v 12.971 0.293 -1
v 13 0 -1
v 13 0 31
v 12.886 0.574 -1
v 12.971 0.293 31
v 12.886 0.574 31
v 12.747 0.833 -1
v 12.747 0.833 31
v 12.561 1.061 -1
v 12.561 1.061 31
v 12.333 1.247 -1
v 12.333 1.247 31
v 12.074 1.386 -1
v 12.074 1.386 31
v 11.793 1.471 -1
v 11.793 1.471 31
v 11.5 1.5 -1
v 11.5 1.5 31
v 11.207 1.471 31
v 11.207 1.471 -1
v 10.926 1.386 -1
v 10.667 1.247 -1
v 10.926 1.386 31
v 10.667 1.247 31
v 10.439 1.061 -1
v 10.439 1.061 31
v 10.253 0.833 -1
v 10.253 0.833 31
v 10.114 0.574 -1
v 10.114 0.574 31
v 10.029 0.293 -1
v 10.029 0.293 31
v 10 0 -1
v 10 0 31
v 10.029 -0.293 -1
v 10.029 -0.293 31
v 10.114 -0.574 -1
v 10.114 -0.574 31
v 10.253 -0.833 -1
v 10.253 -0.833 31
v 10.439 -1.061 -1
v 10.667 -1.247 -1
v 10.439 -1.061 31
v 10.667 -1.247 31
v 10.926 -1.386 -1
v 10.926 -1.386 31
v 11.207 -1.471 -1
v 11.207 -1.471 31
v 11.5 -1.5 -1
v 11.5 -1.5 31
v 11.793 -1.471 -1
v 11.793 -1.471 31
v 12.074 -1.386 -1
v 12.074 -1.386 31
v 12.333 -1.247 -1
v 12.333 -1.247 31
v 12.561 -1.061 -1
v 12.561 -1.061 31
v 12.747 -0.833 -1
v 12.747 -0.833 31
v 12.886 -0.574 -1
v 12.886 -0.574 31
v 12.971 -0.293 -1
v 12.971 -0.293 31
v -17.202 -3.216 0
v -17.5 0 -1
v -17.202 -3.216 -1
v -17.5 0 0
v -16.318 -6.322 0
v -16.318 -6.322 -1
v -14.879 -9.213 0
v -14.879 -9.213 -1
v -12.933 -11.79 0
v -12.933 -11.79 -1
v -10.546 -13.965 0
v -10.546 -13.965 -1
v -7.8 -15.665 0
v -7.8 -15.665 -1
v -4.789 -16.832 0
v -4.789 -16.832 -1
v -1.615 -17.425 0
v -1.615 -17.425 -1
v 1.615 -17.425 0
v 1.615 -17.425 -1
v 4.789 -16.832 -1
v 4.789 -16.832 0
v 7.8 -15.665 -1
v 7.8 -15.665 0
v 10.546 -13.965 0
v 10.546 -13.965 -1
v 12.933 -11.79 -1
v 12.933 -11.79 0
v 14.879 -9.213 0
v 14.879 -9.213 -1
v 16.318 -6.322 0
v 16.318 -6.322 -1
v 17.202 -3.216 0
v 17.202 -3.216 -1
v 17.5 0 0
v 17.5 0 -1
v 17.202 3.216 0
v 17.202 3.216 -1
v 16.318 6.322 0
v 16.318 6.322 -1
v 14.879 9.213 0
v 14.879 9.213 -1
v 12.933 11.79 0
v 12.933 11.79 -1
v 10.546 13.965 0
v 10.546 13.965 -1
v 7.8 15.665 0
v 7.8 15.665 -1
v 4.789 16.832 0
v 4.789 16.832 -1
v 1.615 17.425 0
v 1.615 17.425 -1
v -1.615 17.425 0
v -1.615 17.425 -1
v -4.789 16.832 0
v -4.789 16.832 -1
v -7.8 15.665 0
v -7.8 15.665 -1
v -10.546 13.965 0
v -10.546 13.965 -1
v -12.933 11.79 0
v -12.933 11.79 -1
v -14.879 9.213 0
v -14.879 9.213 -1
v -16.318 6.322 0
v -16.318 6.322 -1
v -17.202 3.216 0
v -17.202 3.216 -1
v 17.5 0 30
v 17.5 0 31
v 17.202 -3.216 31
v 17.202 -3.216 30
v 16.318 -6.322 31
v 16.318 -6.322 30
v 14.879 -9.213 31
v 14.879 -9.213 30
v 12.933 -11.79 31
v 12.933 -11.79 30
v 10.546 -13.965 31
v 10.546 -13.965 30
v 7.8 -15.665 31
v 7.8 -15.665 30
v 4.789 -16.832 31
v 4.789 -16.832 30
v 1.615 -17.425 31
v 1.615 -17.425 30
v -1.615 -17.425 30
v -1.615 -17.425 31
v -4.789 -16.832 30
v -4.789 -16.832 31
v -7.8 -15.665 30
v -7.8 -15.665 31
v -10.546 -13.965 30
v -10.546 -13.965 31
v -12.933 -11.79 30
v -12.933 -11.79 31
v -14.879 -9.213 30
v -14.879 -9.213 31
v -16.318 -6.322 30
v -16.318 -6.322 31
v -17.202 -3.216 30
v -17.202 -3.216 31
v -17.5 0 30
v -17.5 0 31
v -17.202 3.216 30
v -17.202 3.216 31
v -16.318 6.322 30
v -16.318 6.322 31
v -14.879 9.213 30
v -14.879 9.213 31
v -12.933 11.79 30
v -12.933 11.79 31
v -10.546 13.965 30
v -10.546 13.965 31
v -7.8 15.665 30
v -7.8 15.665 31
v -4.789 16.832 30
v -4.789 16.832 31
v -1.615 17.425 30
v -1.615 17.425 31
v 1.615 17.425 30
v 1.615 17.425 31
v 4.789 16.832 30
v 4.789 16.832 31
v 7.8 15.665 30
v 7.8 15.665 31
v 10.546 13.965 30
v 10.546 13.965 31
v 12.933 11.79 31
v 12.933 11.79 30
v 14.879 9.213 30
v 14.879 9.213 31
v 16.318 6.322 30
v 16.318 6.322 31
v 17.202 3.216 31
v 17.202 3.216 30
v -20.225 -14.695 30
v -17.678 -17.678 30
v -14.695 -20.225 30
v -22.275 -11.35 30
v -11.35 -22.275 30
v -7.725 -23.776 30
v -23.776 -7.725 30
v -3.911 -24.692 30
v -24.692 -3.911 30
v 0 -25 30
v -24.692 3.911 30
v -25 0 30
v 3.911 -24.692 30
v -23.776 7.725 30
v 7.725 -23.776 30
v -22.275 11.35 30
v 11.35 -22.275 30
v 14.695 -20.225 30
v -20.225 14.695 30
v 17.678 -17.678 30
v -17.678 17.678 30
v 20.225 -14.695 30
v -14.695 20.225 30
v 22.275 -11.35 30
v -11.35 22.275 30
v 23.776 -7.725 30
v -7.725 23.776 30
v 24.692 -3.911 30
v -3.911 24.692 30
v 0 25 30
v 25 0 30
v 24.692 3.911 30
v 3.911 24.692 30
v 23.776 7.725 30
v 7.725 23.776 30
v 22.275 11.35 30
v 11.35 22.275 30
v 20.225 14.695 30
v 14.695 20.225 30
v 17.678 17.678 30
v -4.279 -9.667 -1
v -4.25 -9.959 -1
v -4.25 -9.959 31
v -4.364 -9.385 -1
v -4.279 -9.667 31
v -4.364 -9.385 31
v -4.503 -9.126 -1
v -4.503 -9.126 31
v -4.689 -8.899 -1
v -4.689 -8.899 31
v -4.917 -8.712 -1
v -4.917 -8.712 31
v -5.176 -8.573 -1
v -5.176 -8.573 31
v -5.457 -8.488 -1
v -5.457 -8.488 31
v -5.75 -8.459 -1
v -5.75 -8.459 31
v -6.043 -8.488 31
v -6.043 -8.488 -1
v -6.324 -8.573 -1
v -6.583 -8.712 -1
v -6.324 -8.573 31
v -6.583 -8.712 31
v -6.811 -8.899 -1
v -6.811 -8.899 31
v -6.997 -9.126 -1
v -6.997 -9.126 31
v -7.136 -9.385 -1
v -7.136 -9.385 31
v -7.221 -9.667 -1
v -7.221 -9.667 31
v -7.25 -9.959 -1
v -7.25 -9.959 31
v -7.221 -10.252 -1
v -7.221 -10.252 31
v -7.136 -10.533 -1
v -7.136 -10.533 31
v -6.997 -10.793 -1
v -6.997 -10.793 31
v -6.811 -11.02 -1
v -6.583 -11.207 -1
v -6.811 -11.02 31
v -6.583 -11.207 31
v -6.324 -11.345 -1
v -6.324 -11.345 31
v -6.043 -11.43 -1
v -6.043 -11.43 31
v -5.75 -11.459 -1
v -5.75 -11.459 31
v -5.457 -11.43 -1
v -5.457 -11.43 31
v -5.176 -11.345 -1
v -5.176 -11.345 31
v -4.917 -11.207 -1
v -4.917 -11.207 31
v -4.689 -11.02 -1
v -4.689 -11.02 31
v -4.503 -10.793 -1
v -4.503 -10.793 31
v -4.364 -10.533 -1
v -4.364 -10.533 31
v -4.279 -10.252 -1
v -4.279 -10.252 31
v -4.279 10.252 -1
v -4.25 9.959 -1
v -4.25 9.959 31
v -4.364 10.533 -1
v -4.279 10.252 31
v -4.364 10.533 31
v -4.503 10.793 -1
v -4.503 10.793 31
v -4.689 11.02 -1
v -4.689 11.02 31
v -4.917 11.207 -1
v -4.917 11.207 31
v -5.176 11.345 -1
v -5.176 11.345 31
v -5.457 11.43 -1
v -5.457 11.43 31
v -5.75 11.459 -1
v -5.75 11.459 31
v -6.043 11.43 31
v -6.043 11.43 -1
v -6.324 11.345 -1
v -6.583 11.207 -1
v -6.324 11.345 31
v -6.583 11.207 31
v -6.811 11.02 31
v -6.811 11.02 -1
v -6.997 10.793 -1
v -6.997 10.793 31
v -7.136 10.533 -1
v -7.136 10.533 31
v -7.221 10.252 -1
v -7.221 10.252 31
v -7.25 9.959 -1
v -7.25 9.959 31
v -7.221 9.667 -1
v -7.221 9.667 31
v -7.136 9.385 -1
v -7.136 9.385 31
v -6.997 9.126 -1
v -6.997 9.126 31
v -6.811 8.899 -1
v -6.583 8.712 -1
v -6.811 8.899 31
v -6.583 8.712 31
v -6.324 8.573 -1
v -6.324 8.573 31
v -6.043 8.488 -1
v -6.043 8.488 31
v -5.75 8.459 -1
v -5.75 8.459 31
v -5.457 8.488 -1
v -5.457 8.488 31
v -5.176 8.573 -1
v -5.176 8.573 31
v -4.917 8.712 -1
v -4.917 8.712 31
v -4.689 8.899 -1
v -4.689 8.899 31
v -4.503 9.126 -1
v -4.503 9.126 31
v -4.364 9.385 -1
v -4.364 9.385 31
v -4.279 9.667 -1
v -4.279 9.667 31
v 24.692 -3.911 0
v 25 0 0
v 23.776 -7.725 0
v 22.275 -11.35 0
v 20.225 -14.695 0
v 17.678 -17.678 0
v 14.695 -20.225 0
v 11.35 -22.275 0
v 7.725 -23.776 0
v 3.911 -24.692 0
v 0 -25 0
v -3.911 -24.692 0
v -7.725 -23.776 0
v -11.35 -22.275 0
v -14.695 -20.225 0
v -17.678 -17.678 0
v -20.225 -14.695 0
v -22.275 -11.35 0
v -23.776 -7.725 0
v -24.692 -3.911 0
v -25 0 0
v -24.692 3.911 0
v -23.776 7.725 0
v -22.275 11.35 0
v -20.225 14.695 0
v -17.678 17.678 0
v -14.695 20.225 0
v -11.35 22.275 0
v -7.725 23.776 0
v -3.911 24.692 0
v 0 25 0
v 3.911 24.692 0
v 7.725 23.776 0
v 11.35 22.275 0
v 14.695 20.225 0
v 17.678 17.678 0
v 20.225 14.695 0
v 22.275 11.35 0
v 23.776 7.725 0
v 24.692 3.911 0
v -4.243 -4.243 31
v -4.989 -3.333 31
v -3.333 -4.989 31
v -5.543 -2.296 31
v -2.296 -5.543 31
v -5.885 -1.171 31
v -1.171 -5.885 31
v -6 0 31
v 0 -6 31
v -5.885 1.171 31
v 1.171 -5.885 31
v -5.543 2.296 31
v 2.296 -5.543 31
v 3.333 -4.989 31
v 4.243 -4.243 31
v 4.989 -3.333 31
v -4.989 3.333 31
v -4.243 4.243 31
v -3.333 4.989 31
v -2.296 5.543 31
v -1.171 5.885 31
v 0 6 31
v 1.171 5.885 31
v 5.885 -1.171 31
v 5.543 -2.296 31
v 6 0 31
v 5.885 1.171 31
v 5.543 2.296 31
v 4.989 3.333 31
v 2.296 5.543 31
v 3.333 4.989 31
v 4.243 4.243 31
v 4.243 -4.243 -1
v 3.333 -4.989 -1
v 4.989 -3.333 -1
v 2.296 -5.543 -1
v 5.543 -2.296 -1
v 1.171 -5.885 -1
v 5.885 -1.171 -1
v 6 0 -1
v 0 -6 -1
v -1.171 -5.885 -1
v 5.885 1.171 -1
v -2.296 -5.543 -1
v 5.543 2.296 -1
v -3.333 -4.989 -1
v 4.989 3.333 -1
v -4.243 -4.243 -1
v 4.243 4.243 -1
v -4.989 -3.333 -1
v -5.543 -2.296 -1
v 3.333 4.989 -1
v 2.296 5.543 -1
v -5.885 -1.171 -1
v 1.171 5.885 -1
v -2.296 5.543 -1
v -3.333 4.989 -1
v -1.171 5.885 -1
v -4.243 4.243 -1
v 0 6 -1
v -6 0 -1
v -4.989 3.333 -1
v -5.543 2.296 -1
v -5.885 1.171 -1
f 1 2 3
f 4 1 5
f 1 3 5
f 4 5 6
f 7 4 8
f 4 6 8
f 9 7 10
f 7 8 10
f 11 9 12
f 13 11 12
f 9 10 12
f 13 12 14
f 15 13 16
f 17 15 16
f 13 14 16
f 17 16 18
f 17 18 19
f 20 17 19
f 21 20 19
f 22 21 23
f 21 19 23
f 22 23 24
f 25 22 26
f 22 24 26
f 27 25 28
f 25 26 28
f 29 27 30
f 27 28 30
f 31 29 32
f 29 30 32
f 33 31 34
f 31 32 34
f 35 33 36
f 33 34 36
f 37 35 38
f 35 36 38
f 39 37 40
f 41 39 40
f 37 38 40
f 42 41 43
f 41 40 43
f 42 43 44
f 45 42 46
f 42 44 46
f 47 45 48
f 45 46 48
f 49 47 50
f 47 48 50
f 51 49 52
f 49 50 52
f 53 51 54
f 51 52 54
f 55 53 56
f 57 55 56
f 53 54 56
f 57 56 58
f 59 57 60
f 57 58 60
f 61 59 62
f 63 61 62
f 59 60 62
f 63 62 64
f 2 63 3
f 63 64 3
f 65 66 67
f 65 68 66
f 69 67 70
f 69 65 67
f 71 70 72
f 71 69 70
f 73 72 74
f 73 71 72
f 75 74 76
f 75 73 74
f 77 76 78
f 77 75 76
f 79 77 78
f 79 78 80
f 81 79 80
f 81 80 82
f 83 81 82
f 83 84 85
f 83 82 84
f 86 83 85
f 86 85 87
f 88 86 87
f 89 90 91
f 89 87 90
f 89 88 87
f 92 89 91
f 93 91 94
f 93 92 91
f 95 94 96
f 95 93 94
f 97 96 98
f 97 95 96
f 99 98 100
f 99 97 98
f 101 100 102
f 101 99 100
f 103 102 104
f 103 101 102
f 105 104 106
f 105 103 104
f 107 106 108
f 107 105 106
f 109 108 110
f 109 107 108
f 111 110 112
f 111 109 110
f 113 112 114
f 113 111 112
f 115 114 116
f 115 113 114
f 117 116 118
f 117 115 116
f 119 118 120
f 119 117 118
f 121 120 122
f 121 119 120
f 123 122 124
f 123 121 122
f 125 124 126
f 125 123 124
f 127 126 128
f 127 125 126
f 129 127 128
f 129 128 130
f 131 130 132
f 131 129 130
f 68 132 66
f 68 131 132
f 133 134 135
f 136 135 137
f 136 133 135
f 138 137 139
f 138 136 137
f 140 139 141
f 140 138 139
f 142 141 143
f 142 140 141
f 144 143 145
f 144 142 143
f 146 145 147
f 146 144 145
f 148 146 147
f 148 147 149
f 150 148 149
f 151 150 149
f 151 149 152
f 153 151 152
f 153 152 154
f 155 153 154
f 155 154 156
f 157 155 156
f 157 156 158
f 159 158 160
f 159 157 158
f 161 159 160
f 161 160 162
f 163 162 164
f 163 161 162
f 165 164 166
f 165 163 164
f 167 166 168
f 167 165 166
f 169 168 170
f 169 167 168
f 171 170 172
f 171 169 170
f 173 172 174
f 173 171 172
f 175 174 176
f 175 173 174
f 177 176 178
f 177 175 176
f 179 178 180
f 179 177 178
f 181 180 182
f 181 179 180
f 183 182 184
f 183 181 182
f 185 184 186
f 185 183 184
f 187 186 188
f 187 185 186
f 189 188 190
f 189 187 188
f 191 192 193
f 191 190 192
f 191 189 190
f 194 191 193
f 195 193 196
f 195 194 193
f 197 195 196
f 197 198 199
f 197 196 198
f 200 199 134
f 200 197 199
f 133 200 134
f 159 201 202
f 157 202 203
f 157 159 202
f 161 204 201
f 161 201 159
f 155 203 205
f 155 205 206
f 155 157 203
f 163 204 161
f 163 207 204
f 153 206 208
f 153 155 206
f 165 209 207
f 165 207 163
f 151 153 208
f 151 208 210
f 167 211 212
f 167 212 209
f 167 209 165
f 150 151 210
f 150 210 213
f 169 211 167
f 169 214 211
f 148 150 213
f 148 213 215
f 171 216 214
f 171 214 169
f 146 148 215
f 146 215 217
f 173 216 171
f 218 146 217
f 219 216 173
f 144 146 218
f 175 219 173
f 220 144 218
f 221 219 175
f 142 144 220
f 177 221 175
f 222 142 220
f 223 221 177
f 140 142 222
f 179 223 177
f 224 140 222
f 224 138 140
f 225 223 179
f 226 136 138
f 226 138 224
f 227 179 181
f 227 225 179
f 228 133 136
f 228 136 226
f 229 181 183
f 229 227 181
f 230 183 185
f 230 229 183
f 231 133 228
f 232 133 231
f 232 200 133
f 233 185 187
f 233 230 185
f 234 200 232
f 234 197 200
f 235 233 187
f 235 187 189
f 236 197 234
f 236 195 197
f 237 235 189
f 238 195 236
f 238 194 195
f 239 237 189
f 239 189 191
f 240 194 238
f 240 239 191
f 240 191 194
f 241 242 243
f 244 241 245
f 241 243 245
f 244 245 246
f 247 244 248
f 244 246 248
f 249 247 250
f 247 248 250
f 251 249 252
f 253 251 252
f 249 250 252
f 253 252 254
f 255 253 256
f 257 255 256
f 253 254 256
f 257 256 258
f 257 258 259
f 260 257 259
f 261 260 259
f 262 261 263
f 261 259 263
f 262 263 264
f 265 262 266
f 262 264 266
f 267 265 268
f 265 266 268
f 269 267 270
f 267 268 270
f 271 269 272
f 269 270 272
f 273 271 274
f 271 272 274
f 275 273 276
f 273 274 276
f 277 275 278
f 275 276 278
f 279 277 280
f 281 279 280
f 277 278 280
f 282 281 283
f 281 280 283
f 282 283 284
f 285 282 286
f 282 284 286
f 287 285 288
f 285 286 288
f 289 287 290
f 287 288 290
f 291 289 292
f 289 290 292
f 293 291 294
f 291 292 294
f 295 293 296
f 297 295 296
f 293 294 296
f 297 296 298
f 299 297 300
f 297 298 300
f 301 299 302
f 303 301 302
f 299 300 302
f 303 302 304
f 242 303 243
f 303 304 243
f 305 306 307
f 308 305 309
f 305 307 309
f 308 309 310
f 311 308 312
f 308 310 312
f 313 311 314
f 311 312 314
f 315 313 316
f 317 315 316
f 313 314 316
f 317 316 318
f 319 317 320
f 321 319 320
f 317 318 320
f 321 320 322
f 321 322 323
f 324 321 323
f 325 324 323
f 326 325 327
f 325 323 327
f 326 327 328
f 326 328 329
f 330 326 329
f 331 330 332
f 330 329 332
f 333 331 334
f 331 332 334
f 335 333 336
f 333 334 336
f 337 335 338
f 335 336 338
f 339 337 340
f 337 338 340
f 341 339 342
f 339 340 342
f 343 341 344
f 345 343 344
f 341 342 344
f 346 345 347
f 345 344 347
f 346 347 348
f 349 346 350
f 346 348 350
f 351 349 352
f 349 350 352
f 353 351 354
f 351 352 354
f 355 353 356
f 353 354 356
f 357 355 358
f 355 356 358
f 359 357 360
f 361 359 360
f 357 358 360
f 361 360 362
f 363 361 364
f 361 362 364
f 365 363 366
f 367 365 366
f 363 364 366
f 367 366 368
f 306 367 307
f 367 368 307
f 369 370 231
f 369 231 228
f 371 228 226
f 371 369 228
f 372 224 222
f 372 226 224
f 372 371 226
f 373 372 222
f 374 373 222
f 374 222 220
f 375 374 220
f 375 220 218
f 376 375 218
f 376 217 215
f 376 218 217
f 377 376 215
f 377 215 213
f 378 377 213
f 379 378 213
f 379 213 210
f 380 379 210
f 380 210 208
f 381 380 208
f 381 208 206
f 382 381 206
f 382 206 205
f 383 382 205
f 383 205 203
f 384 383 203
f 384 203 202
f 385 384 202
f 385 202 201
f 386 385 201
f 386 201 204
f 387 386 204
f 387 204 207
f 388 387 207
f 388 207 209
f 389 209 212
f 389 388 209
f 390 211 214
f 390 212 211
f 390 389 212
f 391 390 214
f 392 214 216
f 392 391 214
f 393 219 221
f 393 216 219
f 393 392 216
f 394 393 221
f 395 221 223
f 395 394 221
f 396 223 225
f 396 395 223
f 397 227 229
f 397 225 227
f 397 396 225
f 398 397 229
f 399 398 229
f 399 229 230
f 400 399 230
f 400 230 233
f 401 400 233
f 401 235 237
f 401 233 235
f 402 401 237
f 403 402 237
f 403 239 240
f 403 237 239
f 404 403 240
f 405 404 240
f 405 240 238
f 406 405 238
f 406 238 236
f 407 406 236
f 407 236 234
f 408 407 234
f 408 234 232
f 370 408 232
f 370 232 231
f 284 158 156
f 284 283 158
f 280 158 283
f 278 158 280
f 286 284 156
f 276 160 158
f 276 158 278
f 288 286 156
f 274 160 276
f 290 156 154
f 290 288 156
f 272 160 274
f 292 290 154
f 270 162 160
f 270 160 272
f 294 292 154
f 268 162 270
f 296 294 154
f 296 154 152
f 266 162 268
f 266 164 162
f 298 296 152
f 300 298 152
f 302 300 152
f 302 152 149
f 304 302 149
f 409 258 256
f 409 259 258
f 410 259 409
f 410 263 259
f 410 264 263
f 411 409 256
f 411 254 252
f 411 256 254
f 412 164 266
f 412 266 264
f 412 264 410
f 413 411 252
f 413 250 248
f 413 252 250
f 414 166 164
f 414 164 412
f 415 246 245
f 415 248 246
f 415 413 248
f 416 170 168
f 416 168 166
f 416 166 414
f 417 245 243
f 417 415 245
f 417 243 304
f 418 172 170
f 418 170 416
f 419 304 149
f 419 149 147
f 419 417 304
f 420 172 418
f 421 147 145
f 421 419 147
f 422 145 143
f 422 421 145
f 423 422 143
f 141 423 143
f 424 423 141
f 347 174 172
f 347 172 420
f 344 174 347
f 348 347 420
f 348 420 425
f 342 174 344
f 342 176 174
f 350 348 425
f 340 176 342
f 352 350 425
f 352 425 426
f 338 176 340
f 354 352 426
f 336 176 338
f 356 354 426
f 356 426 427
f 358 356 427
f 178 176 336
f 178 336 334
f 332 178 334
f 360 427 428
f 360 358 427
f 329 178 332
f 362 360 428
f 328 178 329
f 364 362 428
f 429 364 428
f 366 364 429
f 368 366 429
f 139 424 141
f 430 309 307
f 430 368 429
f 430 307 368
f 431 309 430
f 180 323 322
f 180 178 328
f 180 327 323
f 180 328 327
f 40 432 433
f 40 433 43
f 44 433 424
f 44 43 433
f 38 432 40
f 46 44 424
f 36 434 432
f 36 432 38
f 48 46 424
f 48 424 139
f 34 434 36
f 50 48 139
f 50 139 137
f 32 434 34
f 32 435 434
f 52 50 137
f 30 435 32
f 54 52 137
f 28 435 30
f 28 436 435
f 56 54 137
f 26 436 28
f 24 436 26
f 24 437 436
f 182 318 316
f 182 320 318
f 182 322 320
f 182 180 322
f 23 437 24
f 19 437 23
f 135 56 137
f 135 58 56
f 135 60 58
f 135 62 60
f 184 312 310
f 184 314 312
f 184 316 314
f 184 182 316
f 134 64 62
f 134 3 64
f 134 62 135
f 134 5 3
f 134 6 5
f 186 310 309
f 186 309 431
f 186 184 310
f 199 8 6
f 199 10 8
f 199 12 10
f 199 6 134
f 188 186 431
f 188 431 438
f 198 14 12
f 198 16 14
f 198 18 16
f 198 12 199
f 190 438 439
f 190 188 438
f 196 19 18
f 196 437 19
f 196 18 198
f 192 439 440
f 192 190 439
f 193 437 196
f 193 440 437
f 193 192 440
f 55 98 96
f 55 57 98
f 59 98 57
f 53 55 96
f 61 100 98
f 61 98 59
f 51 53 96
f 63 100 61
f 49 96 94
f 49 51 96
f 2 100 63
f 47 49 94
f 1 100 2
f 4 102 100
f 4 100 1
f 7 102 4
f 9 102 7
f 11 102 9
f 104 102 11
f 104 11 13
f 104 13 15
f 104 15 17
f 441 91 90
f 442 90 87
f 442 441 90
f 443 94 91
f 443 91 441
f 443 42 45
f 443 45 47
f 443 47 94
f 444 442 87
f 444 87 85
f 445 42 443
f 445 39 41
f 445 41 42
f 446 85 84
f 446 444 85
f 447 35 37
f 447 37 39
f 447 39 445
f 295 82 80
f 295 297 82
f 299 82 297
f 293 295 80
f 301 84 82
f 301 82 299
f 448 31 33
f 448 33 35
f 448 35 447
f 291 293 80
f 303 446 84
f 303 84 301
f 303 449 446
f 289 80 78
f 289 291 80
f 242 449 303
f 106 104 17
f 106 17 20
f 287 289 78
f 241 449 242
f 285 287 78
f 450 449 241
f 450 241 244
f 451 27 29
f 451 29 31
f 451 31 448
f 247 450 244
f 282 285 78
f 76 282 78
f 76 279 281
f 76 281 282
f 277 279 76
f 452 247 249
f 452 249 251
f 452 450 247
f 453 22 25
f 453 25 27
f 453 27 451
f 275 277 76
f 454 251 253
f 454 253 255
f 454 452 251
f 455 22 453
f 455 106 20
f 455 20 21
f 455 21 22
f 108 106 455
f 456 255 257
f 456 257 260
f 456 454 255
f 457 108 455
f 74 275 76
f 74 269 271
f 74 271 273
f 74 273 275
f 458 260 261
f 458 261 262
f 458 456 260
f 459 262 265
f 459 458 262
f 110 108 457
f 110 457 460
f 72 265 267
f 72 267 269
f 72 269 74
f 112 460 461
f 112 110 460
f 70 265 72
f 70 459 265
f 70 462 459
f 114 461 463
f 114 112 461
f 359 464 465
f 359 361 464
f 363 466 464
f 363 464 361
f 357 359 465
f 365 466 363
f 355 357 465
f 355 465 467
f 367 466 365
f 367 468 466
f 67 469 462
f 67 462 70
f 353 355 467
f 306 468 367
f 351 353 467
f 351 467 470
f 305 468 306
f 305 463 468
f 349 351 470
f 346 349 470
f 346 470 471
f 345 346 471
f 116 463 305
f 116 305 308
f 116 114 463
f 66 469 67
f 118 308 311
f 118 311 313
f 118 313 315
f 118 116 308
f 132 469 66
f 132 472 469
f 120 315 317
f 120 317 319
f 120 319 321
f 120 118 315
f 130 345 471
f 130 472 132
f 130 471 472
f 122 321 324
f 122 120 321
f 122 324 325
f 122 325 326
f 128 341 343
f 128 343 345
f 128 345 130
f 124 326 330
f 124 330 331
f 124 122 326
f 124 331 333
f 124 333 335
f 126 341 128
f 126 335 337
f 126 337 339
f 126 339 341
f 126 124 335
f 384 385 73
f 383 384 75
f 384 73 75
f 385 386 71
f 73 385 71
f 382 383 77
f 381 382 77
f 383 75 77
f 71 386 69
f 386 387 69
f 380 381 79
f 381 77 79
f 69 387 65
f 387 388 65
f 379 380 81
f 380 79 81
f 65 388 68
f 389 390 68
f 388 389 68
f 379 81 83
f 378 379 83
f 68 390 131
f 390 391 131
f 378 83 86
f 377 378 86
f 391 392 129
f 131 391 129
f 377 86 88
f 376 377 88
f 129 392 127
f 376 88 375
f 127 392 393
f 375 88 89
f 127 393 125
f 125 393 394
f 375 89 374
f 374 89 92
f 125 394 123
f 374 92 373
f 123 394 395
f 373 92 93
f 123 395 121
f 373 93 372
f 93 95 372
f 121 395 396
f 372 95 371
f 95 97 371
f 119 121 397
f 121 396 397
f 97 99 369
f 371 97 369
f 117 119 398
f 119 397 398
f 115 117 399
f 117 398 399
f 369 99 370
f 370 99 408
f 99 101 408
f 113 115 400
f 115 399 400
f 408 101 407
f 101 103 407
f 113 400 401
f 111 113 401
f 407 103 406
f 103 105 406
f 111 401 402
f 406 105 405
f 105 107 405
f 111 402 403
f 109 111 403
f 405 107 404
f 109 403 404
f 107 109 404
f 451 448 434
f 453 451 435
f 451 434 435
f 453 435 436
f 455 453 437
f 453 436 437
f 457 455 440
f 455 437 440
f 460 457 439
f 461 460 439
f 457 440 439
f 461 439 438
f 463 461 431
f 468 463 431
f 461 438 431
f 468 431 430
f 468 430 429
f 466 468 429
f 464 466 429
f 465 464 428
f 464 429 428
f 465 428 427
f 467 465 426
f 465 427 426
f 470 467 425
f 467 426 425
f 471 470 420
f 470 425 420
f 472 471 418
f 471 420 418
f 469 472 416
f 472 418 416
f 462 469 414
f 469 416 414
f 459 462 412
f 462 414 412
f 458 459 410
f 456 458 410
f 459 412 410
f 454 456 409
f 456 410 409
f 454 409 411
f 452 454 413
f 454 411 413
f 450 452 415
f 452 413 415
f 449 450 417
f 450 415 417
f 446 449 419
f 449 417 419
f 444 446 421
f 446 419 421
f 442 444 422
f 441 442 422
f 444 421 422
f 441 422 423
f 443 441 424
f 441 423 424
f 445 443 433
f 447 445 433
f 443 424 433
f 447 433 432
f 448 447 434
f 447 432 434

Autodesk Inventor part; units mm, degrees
ref_plane "YZ Plane" through (0, 0, 0) normal (1, 0, 0) x (0, 1, 0)
ref_plane "XZ Plane" through (0, 0, 0) normal (0, 1, 0) x (-1, 0, 0)
ref_plane "XY Plane" through (0, 0, 0) normal (0, 0, 1) x (1, 0, 0)
sketch "Skizze1" plane through (0, 0, 0) normal (0, 0, 1) x (1, 0, 0)
  circle A0 centre (0, 0) radius 17.5
  dimension "d1" = 35
extrude "Extrusion1" add sketch "Skizze1" along normal blind 31
sketch "Skizze2" plane through (0, 0, 0) normal (0, 0, -1) x (-1, 0, 0)
  point P0 (0, 0)
ref_plane "Arbeitsebene1" through (0, 0, 0) normal (0, 0, 1) x (1, 0, 0)
sketch "Skizze3" plane through (0, 0, 0) normal (0, 0, 1) x (1, 0, 0)
  circle A0 centre (0, 0) radius 25
  dimension "d7" = 50
extrude "Extrusion3" add sketch "Skizze3" along normal blind 30
sketch "Skizze4" plane through (0, 0, 0) normal (0, 0, -1) x (-1, 0, 0)
  circle A0 centre (0, 0) radius 17.5
extrude "Extrusion4" add sketch "Skizze4" along normal blind 1
sketch "Skizze5" plane through (0, 0, 31) normal (0, 0, 1) x (1, 0, 0)
  line L0 (0, 0) -> (11.5, 0) construction
  line L1 (0, 0) -> (11.5, 0) construction
  circle A0 centre (-5.75, -9.9593) radius 1.5
  circle A1 centre (-5.75, 9.9593) radius 1.5
  circle A2 centre (11.5, 0) radius 1.5
  circle A3 centre (0, 0) radius 6
  dimension "d18" = 3
  dimension "d19" = 3
  dimension "d20" = 3
  dimension "d21" = 12
extrude "Extrusion5" cut sketch "Skizze5" against normal through all
properties part number "Drohnenrad"
